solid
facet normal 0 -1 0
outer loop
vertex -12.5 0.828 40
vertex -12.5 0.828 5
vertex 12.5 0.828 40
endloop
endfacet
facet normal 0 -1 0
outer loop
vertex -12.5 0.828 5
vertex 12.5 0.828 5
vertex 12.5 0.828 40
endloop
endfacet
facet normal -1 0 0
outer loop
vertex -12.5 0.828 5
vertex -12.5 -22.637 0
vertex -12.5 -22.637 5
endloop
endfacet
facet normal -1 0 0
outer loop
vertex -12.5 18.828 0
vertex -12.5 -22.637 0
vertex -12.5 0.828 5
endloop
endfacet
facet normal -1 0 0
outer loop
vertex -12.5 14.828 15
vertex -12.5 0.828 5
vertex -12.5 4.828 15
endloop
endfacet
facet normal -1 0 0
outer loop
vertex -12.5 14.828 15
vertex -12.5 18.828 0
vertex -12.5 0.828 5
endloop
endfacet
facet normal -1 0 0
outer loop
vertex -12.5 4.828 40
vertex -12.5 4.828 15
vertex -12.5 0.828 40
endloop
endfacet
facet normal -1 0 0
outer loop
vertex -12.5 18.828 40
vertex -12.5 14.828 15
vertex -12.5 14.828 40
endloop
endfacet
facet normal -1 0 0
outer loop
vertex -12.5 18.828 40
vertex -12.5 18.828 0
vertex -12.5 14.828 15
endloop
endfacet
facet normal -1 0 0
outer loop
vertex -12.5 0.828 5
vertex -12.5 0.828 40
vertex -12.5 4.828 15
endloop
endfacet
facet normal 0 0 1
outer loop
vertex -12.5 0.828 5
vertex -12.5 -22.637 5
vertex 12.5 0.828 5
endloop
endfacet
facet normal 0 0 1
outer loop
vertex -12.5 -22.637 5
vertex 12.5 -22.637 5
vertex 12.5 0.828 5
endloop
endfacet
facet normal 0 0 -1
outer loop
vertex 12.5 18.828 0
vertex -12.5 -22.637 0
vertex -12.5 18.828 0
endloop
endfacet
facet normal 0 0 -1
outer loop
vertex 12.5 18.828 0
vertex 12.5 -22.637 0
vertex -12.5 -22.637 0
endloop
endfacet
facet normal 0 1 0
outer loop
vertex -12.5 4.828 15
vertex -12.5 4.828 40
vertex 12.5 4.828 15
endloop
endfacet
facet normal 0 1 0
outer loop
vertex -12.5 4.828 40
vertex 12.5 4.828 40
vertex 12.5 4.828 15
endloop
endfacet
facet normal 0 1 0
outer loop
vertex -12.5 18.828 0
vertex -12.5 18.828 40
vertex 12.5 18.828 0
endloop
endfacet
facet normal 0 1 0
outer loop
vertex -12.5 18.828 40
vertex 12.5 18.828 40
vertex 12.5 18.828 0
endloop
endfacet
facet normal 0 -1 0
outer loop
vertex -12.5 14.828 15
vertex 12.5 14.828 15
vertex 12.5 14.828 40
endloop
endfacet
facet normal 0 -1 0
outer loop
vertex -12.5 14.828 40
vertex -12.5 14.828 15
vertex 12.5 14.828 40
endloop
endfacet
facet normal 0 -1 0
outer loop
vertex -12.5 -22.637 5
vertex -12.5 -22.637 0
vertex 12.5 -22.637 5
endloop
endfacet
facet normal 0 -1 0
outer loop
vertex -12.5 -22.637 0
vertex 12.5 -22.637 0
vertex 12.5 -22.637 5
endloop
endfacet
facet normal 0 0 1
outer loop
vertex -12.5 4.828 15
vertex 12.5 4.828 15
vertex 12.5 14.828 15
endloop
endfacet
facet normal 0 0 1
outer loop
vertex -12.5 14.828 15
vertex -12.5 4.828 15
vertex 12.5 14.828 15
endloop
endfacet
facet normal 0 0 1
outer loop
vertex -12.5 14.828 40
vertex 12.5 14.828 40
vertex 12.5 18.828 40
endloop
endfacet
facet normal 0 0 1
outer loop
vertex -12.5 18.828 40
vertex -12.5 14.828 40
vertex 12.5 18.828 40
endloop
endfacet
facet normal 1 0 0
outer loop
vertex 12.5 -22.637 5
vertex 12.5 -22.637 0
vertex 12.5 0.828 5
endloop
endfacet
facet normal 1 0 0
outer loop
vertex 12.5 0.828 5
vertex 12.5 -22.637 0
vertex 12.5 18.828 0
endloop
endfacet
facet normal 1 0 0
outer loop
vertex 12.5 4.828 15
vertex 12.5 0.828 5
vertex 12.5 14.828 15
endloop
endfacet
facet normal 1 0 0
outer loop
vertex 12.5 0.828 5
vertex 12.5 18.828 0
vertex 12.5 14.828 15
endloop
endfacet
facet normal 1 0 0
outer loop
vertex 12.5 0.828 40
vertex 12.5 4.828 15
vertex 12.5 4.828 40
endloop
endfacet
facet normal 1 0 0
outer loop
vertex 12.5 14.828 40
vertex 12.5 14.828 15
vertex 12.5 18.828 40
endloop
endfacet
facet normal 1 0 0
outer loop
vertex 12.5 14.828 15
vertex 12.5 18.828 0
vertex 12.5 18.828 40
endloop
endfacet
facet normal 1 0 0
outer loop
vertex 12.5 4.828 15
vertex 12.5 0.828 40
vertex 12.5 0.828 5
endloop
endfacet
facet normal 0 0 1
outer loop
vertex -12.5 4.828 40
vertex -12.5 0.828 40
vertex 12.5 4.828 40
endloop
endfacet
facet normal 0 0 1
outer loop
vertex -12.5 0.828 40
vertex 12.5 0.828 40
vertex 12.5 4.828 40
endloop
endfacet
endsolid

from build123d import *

# Parameters (mm, degrees)
EXTRUDE_1_DEPTH = 12.5


with BuildPart() as part:
    # 草图1 → 凸台-拉伸1 (new, symmetric)
    with BuildSketch(Plane(origin=(0, 0, 0), x_dir=(0, 0, -1), z_dir=(1, 0, 0))):
        Polygon((-40, 14.827740225), (-40, 18.827740225), (0, 18.827740225), (0, 0), (0, -22.636773072), (-5, -22.636773072), (-5, 0.827740225), (-40, 0.827740225), (-40, 4.827740225), (-15, 4.827740225), (-15, 14.827740225), align=None)
    extrude(amount=EXTRUDE_1_DEPTH, both=True)


solid = part.part
